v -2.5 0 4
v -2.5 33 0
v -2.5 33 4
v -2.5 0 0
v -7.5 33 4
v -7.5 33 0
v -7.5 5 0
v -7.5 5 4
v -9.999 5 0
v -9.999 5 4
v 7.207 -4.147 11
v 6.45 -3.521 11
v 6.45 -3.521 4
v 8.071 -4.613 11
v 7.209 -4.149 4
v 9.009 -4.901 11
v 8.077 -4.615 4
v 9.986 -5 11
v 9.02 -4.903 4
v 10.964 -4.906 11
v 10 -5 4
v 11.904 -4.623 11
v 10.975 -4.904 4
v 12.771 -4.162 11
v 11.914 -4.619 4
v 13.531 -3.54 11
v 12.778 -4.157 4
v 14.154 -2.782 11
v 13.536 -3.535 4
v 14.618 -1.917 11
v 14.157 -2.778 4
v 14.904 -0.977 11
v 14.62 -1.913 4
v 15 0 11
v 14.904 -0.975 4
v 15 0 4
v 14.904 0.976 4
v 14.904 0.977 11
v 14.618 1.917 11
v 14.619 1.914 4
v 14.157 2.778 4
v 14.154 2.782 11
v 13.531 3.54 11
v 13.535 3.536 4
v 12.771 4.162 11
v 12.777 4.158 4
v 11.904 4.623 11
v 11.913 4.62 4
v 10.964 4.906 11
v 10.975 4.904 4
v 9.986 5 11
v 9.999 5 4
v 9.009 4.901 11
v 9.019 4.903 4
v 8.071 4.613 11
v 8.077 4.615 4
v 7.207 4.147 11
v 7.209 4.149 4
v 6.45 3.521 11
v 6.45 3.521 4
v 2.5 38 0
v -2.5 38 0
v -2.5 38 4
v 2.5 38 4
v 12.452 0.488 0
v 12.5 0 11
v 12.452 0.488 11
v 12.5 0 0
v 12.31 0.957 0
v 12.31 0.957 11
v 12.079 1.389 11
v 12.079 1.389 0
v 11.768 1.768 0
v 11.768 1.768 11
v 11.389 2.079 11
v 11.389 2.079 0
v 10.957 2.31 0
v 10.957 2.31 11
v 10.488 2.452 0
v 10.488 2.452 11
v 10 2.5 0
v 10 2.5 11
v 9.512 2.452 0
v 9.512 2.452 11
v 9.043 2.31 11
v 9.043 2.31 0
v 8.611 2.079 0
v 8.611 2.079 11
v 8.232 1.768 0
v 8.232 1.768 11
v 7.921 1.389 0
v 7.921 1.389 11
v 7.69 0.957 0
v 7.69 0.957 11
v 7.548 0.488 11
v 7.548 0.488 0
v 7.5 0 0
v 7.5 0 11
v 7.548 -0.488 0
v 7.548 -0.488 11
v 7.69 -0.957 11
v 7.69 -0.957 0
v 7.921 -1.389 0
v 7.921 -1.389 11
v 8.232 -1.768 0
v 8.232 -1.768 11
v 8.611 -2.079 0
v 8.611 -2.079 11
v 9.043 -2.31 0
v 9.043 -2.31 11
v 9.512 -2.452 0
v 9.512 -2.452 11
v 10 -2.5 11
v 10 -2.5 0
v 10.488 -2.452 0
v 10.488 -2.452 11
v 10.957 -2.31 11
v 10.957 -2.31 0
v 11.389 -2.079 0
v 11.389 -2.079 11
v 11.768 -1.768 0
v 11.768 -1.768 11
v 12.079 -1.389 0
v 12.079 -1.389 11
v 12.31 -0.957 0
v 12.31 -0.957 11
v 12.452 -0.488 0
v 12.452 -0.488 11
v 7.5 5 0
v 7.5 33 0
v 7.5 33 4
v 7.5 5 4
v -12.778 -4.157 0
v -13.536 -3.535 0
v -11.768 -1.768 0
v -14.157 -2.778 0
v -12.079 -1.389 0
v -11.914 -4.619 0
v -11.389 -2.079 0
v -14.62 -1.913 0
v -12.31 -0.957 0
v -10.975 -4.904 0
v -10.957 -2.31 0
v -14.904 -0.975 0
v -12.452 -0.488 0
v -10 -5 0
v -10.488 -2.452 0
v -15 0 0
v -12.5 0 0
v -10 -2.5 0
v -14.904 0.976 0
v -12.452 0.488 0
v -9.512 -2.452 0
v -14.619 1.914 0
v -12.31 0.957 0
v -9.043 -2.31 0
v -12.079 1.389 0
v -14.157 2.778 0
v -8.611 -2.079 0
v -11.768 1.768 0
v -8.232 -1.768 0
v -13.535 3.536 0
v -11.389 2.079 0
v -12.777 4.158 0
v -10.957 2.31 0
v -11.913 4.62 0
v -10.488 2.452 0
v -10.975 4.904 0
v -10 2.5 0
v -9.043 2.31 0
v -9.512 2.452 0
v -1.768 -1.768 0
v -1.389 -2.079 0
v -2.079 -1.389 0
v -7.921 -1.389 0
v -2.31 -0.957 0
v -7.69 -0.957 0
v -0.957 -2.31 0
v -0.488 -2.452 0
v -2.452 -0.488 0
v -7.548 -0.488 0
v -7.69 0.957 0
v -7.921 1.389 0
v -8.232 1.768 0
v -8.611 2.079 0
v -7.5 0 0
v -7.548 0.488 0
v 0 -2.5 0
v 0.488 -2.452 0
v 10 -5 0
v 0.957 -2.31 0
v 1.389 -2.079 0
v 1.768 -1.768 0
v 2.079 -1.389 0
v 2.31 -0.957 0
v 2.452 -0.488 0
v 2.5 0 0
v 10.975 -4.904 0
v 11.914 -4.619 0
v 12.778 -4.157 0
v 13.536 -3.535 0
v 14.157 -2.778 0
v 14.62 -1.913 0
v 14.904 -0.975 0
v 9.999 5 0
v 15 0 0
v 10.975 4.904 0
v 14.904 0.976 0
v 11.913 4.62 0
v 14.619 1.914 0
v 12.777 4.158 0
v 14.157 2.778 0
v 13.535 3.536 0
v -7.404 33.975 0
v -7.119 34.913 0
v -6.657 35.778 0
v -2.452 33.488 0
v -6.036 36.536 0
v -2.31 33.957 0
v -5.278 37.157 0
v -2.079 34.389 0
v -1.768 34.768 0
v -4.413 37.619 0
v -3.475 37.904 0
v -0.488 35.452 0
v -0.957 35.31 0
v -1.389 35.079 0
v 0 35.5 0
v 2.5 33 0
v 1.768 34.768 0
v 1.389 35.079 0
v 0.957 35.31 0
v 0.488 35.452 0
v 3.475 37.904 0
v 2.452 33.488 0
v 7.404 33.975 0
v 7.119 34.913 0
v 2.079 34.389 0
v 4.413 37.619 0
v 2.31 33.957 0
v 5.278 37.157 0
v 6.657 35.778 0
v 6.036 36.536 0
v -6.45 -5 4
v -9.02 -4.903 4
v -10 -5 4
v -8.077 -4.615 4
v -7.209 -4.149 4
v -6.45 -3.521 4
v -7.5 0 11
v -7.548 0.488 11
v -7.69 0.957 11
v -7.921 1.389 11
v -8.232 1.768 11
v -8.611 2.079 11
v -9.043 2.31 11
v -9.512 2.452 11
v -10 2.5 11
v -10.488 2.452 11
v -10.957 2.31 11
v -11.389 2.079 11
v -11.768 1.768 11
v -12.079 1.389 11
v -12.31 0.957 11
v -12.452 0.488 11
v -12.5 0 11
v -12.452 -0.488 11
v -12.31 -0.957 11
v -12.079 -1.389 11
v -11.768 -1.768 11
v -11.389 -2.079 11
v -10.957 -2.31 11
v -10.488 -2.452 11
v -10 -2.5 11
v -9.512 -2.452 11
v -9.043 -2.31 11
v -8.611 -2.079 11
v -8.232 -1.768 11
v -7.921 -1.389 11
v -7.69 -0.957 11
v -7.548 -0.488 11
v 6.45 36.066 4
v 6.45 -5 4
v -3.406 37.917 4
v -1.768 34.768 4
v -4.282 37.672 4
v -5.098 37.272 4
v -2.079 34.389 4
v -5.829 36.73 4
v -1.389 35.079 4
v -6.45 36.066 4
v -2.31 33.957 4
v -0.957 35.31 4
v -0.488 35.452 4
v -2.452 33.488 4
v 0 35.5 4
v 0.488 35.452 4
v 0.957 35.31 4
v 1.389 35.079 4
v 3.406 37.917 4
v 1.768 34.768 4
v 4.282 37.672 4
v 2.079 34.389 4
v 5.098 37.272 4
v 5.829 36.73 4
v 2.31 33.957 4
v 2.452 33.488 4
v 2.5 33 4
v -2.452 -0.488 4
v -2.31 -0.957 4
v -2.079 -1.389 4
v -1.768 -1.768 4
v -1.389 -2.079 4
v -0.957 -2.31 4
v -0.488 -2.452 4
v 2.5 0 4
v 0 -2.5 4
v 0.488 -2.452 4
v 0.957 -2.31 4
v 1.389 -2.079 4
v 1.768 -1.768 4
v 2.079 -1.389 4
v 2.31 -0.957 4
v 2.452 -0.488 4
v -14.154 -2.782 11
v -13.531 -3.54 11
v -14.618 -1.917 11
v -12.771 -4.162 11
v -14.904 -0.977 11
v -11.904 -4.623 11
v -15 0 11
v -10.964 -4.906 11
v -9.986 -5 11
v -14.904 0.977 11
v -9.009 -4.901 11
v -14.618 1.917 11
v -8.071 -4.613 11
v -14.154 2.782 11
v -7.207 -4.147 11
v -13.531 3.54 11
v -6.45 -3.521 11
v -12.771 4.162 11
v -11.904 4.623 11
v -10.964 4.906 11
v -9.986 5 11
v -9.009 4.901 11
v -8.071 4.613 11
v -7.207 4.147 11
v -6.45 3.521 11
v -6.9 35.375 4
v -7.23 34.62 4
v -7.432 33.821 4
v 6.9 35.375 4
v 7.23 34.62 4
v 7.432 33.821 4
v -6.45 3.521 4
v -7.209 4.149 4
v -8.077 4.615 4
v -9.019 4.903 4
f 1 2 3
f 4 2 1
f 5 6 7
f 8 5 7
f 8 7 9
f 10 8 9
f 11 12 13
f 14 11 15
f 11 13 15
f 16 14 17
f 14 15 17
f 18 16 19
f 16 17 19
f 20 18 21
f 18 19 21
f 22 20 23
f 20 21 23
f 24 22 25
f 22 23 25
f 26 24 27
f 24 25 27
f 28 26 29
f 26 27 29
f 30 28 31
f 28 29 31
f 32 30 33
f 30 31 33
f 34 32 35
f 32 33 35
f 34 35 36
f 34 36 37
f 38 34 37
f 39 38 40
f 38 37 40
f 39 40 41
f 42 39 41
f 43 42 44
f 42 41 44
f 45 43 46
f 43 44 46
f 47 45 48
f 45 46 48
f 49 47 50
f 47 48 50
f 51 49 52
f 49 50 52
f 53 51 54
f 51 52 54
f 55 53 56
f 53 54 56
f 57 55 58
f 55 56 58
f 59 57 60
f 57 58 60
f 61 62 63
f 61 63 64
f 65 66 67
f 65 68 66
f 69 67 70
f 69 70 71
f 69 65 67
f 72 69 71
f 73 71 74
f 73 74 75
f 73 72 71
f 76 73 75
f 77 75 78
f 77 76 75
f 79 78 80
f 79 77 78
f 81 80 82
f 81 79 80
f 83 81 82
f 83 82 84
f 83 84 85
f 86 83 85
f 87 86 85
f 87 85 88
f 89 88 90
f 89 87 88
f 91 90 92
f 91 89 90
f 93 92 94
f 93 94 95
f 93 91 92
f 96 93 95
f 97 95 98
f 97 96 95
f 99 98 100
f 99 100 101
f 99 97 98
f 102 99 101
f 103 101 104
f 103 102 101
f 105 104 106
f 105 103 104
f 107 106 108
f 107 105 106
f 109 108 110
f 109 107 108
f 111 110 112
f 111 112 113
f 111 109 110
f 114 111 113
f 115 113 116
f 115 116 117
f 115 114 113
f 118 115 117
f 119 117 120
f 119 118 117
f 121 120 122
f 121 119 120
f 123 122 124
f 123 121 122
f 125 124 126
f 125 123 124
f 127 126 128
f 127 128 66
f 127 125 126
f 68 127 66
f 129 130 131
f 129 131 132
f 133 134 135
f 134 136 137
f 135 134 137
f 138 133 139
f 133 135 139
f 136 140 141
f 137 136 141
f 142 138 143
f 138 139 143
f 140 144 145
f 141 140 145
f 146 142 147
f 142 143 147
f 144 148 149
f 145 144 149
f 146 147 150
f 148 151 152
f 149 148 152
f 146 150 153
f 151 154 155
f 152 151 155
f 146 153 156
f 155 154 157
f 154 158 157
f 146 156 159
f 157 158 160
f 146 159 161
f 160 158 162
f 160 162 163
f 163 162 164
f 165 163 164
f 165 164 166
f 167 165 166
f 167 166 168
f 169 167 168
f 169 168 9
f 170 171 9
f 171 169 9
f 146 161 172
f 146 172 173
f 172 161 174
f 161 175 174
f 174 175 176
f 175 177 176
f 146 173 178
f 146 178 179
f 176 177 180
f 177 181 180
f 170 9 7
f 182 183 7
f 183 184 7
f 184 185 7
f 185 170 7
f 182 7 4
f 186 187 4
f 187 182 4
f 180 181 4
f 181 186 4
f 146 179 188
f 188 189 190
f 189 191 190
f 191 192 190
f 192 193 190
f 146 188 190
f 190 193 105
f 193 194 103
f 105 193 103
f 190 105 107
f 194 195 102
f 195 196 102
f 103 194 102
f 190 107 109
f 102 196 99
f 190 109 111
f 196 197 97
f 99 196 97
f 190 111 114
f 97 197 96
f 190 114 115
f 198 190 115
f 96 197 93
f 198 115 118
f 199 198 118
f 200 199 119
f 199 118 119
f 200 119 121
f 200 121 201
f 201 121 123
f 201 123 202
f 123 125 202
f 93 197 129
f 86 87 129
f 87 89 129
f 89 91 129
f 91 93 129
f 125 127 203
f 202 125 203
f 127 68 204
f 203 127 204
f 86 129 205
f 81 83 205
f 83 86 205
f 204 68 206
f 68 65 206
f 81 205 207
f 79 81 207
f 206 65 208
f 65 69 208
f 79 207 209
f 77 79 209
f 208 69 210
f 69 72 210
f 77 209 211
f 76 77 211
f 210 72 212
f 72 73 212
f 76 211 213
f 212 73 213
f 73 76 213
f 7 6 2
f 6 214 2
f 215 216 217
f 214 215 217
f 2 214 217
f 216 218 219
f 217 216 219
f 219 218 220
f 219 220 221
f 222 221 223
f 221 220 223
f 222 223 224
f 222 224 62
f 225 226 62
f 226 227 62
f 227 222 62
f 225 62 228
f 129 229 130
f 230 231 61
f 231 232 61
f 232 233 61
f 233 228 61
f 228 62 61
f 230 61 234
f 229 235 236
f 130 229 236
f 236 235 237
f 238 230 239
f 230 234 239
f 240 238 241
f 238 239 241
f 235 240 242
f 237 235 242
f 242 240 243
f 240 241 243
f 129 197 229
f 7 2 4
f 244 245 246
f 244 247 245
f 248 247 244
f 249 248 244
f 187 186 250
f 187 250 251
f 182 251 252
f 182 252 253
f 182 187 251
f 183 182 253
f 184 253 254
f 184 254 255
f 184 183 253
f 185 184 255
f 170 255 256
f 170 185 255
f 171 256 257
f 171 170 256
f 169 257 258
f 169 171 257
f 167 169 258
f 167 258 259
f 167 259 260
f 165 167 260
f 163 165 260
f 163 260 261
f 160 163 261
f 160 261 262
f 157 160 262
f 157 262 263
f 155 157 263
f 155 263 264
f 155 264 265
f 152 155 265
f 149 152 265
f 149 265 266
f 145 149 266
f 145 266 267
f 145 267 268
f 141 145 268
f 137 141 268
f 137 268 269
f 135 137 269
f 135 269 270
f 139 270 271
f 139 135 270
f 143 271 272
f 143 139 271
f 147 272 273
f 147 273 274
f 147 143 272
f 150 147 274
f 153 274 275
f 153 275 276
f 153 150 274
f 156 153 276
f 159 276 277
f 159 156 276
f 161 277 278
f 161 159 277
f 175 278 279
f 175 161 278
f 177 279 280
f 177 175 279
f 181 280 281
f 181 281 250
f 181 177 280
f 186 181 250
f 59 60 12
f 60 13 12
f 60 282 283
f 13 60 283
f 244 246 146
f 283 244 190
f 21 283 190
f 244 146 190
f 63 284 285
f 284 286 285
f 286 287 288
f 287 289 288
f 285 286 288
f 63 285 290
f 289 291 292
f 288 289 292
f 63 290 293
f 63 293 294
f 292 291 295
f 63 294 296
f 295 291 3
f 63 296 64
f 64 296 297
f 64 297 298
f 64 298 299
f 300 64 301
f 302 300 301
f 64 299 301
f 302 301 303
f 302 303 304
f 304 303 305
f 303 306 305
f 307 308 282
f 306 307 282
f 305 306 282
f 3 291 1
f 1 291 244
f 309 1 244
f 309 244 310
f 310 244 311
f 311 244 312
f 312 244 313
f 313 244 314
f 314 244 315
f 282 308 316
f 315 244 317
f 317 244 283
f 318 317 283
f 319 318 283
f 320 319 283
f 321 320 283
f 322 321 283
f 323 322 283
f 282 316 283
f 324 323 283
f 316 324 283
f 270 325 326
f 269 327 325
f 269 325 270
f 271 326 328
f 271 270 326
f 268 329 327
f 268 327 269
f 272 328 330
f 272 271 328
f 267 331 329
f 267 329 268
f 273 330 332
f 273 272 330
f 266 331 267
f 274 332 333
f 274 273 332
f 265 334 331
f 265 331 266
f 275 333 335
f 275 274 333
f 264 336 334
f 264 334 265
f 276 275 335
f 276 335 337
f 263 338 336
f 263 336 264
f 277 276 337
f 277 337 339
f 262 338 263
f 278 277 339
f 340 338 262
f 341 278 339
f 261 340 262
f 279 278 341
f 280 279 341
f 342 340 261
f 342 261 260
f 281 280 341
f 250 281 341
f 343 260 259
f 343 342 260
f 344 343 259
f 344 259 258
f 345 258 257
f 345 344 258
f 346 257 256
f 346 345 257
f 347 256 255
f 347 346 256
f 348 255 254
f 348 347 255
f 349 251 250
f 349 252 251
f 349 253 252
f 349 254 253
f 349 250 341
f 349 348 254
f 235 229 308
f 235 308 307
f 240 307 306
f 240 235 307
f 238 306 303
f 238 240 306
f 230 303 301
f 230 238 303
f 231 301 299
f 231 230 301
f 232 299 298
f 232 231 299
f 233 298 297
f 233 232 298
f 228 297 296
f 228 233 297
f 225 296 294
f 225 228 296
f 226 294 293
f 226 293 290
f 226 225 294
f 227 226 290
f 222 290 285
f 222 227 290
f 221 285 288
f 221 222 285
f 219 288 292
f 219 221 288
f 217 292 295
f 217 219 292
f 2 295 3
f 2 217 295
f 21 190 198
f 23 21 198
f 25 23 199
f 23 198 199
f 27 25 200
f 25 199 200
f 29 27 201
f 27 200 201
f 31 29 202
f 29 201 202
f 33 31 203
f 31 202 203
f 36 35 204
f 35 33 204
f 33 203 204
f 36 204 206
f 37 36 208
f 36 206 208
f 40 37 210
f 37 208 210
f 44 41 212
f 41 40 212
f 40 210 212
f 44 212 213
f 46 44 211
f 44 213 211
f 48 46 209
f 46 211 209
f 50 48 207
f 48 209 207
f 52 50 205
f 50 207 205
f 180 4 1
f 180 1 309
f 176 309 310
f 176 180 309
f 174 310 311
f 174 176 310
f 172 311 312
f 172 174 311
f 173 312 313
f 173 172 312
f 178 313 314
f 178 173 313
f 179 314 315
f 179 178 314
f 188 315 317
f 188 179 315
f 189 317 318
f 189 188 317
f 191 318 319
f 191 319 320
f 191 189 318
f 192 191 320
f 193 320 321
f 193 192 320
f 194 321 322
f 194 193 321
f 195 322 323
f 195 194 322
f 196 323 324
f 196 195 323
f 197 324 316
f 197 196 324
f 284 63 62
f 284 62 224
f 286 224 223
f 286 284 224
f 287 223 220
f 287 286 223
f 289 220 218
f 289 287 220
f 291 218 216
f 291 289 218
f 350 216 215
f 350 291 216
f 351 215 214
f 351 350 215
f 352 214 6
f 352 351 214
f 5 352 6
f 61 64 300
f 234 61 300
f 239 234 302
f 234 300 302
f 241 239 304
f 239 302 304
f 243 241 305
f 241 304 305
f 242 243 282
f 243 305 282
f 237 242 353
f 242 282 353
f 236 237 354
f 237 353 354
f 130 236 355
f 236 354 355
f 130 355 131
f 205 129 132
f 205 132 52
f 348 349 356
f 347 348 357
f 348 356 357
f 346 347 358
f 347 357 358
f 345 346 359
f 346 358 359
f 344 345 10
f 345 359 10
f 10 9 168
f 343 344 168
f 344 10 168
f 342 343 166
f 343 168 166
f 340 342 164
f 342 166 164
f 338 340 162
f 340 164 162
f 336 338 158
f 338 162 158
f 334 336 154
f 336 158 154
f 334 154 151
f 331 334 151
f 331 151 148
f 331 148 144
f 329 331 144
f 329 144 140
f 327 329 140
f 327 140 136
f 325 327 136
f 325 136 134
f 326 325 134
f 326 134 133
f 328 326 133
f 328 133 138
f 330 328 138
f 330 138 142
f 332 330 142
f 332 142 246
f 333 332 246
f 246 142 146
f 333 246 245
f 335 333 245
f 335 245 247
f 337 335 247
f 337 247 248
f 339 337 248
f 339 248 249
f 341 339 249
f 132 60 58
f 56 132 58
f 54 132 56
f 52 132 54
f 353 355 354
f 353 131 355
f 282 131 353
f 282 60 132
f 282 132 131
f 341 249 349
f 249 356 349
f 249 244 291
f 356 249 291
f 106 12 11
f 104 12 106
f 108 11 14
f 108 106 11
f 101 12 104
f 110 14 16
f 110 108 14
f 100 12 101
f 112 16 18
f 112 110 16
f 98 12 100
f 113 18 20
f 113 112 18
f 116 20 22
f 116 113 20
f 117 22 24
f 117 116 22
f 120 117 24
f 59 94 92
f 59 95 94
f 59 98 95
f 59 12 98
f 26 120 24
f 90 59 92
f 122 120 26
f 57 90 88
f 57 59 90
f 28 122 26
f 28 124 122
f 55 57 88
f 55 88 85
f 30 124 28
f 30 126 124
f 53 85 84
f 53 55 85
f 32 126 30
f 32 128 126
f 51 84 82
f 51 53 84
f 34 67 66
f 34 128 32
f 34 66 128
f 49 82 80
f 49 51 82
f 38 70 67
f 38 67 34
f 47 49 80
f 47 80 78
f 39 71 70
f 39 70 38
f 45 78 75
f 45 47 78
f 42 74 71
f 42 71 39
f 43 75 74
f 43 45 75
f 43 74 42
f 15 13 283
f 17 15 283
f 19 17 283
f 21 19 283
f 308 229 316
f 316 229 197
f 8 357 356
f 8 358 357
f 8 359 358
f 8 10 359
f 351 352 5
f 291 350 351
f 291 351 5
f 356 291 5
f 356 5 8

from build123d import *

# Parameters (mm, degrees)
SKETCH_R          = 2.5
PAD_DEPTH         = 4
SKETCH001_R       = 5
SKETCH001_R_2     = 2.5
PAD001_DEPTH      = 7
FILLET_R          = 5
SKETCH002_W       = 12.9
SKETCH002_H       = 8.550953
POCKET_DEPTH      = 38.001
POCKET_DEPTH_BACK = 5.001


with BuildPart() as part:
    # Sketch → Pad (new body)
    with BuildSketch(Plane.XY):
        with BuildLine():
            Line((-10, -5), (10, -5))
            ThreePointArc((10, -5), (15, 0.000362), (9.999276, 5))
            Line((7.5, 5), (9.999276, 5))
            Line((7.5, 38), (7.5, 5))
            Line((-7.5, 38), (7.5, 38))
            Line((-7.5, 38), (-7.5, 5))
            Line((-7.5, 5), (-9.999276, 5))
            ThreePointArc((-9.999276, 5), (-15, 0.000362), (-10, -5))
        make_face()
        with Locations((-10, 0)):
            Circle(SKETCH_R, mode=Mode.SUBTRACT)
        with Locations((10, 0)):
            Circle(SKETCH_R, mode=Mode.SUBTRACT)
        with BuildLine():
            ThreePointArc((2.5, 33), (0, 35.5), (-2.5, 33))
            Line((-2.5, 33), (-2.5, 0))
            ThreePointArc((-2.5, 0), (0, -2.5), (2.5, 0))
            Line((2.5, 33), (2.5, 0))
        make_face(mode=Mode.SUBTRACT)
    extrude(amount=PAD_DEPTH)

    # Sketch001 (on Face16 of Pad) → Pad001 (join)
    with BuildSketch(Plane.XY.offset(4)):
        with Locations((10, 0)):
            Circle(SKETCH001_R)
        with Locations((10, 0)):
            Circle(SKETCH001_R_2, mode=Mode.SUBTRACT)
        with Locations((-10, 0)):
            Circle(SKETCH001_R)
        with Locations((-10, 0)):
            Circle(SKETCH001_R_2, mode=Mode.SUBTRACT)
    extrude(amount=PAD001_DEPTH)

    # Fillet
    fillet_edges = [part.edges().sort_by_distance(p)[0] for p in [
        (-7.5, 38, 2),
        (7.5, 38, 2),
    ]]
    fillet(fillet_edges, radius=FILLET_R)

    # Sketch002 → Pocket (cut, two sides)
    with BuildSketch(Plane.XZ) as pocket_sk:
        with Locations((0, 8.275476)):
            Rectangle(SKETCH002_W, SKETCH002_H)
    extrude(amount=-POCKET_DEPTH, mode=Mode.SUBTRACT)
    extrude(pocket_sk.sketch, amount=POCKET_DEPTH_BACK, mode=Mode.SUBTRACT)


solid = part.part
